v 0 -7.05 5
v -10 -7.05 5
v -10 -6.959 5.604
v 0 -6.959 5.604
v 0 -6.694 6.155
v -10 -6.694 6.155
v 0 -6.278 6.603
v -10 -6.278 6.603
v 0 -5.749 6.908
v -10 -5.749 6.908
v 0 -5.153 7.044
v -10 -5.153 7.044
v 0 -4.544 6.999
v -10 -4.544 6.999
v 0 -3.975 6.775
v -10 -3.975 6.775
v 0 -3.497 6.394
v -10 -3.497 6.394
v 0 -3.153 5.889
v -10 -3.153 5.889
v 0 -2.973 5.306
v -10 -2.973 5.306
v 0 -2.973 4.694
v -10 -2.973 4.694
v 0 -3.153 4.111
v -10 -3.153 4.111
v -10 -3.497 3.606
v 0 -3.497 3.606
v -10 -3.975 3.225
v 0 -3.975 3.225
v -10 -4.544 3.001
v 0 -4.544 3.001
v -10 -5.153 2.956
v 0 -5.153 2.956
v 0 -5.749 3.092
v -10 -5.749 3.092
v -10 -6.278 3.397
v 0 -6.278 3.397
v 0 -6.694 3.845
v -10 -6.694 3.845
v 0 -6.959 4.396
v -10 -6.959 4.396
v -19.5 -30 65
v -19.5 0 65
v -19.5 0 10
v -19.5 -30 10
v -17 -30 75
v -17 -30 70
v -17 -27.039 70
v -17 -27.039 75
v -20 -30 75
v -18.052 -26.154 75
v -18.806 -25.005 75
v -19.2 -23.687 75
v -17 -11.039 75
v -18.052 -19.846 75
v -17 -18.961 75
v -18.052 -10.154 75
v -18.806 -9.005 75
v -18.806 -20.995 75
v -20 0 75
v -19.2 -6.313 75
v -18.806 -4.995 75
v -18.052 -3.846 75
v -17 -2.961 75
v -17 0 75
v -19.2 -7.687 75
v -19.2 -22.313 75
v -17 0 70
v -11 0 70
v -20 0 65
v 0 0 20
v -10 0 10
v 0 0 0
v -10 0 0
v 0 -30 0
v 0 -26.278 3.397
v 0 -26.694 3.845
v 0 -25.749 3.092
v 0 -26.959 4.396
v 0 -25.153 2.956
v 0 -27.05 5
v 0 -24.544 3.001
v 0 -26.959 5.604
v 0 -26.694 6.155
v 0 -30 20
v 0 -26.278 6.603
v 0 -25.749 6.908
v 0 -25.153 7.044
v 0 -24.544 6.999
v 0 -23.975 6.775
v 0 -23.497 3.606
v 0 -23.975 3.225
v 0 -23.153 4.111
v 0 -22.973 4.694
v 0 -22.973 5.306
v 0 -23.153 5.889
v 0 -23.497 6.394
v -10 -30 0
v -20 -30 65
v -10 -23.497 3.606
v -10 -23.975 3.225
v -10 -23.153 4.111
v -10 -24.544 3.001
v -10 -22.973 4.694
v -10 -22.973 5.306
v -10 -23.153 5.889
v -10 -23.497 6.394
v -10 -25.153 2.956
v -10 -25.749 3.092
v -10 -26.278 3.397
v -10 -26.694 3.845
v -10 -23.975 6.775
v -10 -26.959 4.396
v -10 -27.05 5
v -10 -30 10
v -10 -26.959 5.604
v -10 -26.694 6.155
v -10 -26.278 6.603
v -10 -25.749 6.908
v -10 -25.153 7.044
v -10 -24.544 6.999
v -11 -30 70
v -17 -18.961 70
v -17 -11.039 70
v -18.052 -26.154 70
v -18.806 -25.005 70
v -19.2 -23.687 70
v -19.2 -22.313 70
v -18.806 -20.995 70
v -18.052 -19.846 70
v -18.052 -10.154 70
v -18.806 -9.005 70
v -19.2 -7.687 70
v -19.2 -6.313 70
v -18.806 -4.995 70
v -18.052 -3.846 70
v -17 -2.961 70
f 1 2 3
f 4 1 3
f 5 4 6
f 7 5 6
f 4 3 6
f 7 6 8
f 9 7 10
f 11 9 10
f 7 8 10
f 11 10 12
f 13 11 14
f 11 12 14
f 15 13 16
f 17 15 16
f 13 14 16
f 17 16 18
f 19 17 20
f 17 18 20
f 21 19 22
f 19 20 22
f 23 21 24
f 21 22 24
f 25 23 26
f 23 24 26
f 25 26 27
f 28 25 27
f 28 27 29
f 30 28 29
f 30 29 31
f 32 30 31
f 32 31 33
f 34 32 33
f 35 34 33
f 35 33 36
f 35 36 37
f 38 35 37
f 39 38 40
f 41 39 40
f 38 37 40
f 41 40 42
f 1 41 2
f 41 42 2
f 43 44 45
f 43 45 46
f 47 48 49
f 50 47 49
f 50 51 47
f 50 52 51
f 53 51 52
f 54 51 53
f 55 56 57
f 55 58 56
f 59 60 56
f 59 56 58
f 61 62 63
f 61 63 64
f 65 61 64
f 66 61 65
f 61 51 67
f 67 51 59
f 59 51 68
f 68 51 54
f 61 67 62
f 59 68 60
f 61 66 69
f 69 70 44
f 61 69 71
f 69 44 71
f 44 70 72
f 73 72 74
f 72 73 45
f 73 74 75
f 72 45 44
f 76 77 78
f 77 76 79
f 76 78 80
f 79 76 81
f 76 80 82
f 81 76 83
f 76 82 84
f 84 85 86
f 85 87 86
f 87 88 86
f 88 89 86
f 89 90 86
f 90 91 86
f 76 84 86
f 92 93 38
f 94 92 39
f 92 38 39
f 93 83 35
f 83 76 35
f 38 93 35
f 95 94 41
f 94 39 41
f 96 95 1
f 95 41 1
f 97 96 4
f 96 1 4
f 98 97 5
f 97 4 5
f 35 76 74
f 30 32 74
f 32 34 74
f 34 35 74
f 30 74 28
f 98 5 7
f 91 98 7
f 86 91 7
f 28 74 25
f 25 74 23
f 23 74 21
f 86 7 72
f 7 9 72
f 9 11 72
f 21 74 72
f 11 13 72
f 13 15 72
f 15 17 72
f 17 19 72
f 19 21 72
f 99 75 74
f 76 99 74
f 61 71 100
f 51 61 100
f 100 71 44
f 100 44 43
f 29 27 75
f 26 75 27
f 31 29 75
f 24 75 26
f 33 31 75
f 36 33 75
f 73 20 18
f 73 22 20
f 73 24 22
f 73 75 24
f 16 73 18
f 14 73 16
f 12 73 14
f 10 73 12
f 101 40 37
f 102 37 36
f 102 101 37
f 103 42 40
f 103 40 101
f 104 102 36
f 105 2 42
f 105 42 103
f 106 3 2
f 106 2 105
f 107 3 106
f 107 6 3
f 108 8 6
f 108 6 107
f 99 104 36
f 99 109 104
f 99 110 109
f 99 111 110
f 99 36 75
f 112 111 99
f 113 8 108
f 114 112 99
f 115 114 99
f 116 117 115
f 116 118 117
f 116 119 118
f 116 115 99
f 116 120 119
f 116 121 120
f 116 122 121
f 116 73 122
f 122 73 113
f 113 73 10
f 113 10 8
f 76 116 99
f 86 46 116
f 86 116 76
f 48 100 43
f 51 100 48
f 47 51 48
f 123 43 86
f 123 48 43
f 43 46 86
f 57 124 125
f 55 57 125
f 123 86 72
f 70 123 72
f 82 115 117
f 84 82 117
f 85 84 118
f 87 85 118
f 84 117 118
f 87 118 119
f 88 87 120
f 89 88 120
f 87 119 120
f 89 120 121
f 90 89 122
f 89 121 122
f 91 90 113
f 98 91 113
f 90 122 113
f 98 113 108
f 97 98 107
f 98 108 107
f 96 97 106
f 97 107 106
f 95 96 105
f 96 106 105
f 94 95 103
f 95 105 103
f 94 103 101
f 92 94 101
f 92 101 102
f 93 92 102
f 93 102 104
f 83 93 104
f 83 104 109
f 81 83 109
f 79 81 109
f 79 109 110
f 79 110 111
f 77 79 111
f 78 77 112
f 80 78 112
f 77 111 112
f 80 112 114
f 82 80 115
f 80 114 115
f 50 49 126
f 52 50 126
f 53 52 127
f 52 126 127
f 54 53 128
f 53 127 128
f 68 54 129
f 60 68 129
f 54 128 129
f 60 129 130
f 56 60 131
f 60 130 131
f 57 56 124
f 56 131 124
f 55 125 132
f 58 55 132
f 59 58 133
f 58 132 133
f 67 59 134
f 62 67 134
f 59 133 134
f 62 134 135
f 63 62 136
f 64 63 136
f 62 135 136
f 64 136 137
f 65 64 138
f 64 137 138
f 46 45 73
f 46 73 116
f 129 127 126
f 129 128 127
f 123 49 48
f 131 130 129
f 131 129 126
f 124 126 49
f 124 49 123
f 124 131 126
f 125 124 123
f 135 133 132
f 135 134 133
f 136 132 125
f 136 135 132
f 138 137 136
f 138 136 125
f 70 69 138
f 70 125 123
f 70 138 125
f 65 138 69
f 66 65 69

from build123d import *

# Parameters (mm, degrees)
F0_W      = 20
F0_H      = 70
F1_DEPTH  = 30
F2_W      = 30
F2_H      = 10
F3_DEPTH  = 10
F4_R      = 2.05
F5_DEPTH  = 10
F6_W      = 11
F6_H      = 30
F7_DEPTH  = 50
F9_DEPTH  = 5
F10_SIZE2 = 10.99999
F10_SIZE  = 49.99999
F11_W     = 30
F11_H     = 55
F12_DEPTH = 0.5


# Not quite as in the source:
# - a fillet or chamfer is up to 0.001 mm smaller than in the source, because OpenCascade refuses the exact size


with BuildPart() as f1:
    # F0 (on Front) → F1 (new body)
    with BuildSketch(Plane.XZ):
        with Locations((-10, 35)):
            Rectangle(F0_W, F0_H)
    extrude(amount=F1_DEPTH)

    # F2 (on face) → F3 (cut)
    with BuildSketch(Plane(origin=(-20, 0, 0), x_dir=(0, -1, 0), z_dir=(-1, 0, 0))):
        with Locations((15, 5)):
            Rectangle(F2_W, F2_H)
    extrude(amount=-F3_DEPTH, mode=Mode.SUBTRACT)

    # F4 (on face) → F5 (cut, through all)
    with BuildSketch(Plane(origin=(-10, 0, 0), x_dir=(0, -1, 0), z_dir=(-1, 0, 0))):
        with Locations((5, 5)):
            Circle(F4_R)
        with Locations((25, 5)):
            Circle(F4_R)
    extrude(amount=-F5_DEPTH, mode=Mode.SUBTRACT)

    # F6 (on face) → F7 (cut)
    with BuildSketch(Plane.XY.offset(70)):
        with Locations((-5.5, -15)):
            Rectangle(F6_W, F6_H)
    extrude(amount=-F7_DEPTH, mode=Mode.SUBTRACT)

    # F8 (on face) → F9 (join)
    with BuildSketch(Plane.XY.offset(70)):
        with BuildLine():
            ThreePointArc((-17, -11.0388736054), (-19.25, -7), (-17, -2.9611263946))
            Line((-17, -2.9611263946), (-17, 0))
            Line((-17, 0), (-20, 0))
            Line((-20, 0), (-20, -30))
            Line((-20, -30), (-17, -30))
            Line((-17, -30), (-17, -27.0388736054))
            ThreePointArc((-17, -27.0388736054), (-19.25, -23), (-17, -18.9611263946))
            Line((-17, -18.9611263946), (-17, -11.0388736054))
        make_face()
    extrude(amount=F9_DEPTH)

    # F10 (size 50 and 11 in the source; OpenCascade refuses exactly that, so slightly less here)
    f10_edges = [f1.edges().sort_by_distance(p)[0] for p in [
        (-11, -15, 20),
    ]]
    f10_side = f1.faces().sort_by_distance((-11, -15, 45))[0]
    chamfer(f10_edges, length=F10_SIZE, length2=F10_SIZE2, reference=f10_side)

    # F11 (on face) → F12 (cut)
    with BuildSketch(Plane(origin=(-20, 0, 0), x_dir=(0, -1, 0), z_dir=(-1, 0, 0))):
        with Locations((15, 37.5)):
            Rectangle(F11_W, F11_H)
    extrude(amount=-F12_DEPTH, mode=Mode.SUBTRACT)


solid = f1.part
